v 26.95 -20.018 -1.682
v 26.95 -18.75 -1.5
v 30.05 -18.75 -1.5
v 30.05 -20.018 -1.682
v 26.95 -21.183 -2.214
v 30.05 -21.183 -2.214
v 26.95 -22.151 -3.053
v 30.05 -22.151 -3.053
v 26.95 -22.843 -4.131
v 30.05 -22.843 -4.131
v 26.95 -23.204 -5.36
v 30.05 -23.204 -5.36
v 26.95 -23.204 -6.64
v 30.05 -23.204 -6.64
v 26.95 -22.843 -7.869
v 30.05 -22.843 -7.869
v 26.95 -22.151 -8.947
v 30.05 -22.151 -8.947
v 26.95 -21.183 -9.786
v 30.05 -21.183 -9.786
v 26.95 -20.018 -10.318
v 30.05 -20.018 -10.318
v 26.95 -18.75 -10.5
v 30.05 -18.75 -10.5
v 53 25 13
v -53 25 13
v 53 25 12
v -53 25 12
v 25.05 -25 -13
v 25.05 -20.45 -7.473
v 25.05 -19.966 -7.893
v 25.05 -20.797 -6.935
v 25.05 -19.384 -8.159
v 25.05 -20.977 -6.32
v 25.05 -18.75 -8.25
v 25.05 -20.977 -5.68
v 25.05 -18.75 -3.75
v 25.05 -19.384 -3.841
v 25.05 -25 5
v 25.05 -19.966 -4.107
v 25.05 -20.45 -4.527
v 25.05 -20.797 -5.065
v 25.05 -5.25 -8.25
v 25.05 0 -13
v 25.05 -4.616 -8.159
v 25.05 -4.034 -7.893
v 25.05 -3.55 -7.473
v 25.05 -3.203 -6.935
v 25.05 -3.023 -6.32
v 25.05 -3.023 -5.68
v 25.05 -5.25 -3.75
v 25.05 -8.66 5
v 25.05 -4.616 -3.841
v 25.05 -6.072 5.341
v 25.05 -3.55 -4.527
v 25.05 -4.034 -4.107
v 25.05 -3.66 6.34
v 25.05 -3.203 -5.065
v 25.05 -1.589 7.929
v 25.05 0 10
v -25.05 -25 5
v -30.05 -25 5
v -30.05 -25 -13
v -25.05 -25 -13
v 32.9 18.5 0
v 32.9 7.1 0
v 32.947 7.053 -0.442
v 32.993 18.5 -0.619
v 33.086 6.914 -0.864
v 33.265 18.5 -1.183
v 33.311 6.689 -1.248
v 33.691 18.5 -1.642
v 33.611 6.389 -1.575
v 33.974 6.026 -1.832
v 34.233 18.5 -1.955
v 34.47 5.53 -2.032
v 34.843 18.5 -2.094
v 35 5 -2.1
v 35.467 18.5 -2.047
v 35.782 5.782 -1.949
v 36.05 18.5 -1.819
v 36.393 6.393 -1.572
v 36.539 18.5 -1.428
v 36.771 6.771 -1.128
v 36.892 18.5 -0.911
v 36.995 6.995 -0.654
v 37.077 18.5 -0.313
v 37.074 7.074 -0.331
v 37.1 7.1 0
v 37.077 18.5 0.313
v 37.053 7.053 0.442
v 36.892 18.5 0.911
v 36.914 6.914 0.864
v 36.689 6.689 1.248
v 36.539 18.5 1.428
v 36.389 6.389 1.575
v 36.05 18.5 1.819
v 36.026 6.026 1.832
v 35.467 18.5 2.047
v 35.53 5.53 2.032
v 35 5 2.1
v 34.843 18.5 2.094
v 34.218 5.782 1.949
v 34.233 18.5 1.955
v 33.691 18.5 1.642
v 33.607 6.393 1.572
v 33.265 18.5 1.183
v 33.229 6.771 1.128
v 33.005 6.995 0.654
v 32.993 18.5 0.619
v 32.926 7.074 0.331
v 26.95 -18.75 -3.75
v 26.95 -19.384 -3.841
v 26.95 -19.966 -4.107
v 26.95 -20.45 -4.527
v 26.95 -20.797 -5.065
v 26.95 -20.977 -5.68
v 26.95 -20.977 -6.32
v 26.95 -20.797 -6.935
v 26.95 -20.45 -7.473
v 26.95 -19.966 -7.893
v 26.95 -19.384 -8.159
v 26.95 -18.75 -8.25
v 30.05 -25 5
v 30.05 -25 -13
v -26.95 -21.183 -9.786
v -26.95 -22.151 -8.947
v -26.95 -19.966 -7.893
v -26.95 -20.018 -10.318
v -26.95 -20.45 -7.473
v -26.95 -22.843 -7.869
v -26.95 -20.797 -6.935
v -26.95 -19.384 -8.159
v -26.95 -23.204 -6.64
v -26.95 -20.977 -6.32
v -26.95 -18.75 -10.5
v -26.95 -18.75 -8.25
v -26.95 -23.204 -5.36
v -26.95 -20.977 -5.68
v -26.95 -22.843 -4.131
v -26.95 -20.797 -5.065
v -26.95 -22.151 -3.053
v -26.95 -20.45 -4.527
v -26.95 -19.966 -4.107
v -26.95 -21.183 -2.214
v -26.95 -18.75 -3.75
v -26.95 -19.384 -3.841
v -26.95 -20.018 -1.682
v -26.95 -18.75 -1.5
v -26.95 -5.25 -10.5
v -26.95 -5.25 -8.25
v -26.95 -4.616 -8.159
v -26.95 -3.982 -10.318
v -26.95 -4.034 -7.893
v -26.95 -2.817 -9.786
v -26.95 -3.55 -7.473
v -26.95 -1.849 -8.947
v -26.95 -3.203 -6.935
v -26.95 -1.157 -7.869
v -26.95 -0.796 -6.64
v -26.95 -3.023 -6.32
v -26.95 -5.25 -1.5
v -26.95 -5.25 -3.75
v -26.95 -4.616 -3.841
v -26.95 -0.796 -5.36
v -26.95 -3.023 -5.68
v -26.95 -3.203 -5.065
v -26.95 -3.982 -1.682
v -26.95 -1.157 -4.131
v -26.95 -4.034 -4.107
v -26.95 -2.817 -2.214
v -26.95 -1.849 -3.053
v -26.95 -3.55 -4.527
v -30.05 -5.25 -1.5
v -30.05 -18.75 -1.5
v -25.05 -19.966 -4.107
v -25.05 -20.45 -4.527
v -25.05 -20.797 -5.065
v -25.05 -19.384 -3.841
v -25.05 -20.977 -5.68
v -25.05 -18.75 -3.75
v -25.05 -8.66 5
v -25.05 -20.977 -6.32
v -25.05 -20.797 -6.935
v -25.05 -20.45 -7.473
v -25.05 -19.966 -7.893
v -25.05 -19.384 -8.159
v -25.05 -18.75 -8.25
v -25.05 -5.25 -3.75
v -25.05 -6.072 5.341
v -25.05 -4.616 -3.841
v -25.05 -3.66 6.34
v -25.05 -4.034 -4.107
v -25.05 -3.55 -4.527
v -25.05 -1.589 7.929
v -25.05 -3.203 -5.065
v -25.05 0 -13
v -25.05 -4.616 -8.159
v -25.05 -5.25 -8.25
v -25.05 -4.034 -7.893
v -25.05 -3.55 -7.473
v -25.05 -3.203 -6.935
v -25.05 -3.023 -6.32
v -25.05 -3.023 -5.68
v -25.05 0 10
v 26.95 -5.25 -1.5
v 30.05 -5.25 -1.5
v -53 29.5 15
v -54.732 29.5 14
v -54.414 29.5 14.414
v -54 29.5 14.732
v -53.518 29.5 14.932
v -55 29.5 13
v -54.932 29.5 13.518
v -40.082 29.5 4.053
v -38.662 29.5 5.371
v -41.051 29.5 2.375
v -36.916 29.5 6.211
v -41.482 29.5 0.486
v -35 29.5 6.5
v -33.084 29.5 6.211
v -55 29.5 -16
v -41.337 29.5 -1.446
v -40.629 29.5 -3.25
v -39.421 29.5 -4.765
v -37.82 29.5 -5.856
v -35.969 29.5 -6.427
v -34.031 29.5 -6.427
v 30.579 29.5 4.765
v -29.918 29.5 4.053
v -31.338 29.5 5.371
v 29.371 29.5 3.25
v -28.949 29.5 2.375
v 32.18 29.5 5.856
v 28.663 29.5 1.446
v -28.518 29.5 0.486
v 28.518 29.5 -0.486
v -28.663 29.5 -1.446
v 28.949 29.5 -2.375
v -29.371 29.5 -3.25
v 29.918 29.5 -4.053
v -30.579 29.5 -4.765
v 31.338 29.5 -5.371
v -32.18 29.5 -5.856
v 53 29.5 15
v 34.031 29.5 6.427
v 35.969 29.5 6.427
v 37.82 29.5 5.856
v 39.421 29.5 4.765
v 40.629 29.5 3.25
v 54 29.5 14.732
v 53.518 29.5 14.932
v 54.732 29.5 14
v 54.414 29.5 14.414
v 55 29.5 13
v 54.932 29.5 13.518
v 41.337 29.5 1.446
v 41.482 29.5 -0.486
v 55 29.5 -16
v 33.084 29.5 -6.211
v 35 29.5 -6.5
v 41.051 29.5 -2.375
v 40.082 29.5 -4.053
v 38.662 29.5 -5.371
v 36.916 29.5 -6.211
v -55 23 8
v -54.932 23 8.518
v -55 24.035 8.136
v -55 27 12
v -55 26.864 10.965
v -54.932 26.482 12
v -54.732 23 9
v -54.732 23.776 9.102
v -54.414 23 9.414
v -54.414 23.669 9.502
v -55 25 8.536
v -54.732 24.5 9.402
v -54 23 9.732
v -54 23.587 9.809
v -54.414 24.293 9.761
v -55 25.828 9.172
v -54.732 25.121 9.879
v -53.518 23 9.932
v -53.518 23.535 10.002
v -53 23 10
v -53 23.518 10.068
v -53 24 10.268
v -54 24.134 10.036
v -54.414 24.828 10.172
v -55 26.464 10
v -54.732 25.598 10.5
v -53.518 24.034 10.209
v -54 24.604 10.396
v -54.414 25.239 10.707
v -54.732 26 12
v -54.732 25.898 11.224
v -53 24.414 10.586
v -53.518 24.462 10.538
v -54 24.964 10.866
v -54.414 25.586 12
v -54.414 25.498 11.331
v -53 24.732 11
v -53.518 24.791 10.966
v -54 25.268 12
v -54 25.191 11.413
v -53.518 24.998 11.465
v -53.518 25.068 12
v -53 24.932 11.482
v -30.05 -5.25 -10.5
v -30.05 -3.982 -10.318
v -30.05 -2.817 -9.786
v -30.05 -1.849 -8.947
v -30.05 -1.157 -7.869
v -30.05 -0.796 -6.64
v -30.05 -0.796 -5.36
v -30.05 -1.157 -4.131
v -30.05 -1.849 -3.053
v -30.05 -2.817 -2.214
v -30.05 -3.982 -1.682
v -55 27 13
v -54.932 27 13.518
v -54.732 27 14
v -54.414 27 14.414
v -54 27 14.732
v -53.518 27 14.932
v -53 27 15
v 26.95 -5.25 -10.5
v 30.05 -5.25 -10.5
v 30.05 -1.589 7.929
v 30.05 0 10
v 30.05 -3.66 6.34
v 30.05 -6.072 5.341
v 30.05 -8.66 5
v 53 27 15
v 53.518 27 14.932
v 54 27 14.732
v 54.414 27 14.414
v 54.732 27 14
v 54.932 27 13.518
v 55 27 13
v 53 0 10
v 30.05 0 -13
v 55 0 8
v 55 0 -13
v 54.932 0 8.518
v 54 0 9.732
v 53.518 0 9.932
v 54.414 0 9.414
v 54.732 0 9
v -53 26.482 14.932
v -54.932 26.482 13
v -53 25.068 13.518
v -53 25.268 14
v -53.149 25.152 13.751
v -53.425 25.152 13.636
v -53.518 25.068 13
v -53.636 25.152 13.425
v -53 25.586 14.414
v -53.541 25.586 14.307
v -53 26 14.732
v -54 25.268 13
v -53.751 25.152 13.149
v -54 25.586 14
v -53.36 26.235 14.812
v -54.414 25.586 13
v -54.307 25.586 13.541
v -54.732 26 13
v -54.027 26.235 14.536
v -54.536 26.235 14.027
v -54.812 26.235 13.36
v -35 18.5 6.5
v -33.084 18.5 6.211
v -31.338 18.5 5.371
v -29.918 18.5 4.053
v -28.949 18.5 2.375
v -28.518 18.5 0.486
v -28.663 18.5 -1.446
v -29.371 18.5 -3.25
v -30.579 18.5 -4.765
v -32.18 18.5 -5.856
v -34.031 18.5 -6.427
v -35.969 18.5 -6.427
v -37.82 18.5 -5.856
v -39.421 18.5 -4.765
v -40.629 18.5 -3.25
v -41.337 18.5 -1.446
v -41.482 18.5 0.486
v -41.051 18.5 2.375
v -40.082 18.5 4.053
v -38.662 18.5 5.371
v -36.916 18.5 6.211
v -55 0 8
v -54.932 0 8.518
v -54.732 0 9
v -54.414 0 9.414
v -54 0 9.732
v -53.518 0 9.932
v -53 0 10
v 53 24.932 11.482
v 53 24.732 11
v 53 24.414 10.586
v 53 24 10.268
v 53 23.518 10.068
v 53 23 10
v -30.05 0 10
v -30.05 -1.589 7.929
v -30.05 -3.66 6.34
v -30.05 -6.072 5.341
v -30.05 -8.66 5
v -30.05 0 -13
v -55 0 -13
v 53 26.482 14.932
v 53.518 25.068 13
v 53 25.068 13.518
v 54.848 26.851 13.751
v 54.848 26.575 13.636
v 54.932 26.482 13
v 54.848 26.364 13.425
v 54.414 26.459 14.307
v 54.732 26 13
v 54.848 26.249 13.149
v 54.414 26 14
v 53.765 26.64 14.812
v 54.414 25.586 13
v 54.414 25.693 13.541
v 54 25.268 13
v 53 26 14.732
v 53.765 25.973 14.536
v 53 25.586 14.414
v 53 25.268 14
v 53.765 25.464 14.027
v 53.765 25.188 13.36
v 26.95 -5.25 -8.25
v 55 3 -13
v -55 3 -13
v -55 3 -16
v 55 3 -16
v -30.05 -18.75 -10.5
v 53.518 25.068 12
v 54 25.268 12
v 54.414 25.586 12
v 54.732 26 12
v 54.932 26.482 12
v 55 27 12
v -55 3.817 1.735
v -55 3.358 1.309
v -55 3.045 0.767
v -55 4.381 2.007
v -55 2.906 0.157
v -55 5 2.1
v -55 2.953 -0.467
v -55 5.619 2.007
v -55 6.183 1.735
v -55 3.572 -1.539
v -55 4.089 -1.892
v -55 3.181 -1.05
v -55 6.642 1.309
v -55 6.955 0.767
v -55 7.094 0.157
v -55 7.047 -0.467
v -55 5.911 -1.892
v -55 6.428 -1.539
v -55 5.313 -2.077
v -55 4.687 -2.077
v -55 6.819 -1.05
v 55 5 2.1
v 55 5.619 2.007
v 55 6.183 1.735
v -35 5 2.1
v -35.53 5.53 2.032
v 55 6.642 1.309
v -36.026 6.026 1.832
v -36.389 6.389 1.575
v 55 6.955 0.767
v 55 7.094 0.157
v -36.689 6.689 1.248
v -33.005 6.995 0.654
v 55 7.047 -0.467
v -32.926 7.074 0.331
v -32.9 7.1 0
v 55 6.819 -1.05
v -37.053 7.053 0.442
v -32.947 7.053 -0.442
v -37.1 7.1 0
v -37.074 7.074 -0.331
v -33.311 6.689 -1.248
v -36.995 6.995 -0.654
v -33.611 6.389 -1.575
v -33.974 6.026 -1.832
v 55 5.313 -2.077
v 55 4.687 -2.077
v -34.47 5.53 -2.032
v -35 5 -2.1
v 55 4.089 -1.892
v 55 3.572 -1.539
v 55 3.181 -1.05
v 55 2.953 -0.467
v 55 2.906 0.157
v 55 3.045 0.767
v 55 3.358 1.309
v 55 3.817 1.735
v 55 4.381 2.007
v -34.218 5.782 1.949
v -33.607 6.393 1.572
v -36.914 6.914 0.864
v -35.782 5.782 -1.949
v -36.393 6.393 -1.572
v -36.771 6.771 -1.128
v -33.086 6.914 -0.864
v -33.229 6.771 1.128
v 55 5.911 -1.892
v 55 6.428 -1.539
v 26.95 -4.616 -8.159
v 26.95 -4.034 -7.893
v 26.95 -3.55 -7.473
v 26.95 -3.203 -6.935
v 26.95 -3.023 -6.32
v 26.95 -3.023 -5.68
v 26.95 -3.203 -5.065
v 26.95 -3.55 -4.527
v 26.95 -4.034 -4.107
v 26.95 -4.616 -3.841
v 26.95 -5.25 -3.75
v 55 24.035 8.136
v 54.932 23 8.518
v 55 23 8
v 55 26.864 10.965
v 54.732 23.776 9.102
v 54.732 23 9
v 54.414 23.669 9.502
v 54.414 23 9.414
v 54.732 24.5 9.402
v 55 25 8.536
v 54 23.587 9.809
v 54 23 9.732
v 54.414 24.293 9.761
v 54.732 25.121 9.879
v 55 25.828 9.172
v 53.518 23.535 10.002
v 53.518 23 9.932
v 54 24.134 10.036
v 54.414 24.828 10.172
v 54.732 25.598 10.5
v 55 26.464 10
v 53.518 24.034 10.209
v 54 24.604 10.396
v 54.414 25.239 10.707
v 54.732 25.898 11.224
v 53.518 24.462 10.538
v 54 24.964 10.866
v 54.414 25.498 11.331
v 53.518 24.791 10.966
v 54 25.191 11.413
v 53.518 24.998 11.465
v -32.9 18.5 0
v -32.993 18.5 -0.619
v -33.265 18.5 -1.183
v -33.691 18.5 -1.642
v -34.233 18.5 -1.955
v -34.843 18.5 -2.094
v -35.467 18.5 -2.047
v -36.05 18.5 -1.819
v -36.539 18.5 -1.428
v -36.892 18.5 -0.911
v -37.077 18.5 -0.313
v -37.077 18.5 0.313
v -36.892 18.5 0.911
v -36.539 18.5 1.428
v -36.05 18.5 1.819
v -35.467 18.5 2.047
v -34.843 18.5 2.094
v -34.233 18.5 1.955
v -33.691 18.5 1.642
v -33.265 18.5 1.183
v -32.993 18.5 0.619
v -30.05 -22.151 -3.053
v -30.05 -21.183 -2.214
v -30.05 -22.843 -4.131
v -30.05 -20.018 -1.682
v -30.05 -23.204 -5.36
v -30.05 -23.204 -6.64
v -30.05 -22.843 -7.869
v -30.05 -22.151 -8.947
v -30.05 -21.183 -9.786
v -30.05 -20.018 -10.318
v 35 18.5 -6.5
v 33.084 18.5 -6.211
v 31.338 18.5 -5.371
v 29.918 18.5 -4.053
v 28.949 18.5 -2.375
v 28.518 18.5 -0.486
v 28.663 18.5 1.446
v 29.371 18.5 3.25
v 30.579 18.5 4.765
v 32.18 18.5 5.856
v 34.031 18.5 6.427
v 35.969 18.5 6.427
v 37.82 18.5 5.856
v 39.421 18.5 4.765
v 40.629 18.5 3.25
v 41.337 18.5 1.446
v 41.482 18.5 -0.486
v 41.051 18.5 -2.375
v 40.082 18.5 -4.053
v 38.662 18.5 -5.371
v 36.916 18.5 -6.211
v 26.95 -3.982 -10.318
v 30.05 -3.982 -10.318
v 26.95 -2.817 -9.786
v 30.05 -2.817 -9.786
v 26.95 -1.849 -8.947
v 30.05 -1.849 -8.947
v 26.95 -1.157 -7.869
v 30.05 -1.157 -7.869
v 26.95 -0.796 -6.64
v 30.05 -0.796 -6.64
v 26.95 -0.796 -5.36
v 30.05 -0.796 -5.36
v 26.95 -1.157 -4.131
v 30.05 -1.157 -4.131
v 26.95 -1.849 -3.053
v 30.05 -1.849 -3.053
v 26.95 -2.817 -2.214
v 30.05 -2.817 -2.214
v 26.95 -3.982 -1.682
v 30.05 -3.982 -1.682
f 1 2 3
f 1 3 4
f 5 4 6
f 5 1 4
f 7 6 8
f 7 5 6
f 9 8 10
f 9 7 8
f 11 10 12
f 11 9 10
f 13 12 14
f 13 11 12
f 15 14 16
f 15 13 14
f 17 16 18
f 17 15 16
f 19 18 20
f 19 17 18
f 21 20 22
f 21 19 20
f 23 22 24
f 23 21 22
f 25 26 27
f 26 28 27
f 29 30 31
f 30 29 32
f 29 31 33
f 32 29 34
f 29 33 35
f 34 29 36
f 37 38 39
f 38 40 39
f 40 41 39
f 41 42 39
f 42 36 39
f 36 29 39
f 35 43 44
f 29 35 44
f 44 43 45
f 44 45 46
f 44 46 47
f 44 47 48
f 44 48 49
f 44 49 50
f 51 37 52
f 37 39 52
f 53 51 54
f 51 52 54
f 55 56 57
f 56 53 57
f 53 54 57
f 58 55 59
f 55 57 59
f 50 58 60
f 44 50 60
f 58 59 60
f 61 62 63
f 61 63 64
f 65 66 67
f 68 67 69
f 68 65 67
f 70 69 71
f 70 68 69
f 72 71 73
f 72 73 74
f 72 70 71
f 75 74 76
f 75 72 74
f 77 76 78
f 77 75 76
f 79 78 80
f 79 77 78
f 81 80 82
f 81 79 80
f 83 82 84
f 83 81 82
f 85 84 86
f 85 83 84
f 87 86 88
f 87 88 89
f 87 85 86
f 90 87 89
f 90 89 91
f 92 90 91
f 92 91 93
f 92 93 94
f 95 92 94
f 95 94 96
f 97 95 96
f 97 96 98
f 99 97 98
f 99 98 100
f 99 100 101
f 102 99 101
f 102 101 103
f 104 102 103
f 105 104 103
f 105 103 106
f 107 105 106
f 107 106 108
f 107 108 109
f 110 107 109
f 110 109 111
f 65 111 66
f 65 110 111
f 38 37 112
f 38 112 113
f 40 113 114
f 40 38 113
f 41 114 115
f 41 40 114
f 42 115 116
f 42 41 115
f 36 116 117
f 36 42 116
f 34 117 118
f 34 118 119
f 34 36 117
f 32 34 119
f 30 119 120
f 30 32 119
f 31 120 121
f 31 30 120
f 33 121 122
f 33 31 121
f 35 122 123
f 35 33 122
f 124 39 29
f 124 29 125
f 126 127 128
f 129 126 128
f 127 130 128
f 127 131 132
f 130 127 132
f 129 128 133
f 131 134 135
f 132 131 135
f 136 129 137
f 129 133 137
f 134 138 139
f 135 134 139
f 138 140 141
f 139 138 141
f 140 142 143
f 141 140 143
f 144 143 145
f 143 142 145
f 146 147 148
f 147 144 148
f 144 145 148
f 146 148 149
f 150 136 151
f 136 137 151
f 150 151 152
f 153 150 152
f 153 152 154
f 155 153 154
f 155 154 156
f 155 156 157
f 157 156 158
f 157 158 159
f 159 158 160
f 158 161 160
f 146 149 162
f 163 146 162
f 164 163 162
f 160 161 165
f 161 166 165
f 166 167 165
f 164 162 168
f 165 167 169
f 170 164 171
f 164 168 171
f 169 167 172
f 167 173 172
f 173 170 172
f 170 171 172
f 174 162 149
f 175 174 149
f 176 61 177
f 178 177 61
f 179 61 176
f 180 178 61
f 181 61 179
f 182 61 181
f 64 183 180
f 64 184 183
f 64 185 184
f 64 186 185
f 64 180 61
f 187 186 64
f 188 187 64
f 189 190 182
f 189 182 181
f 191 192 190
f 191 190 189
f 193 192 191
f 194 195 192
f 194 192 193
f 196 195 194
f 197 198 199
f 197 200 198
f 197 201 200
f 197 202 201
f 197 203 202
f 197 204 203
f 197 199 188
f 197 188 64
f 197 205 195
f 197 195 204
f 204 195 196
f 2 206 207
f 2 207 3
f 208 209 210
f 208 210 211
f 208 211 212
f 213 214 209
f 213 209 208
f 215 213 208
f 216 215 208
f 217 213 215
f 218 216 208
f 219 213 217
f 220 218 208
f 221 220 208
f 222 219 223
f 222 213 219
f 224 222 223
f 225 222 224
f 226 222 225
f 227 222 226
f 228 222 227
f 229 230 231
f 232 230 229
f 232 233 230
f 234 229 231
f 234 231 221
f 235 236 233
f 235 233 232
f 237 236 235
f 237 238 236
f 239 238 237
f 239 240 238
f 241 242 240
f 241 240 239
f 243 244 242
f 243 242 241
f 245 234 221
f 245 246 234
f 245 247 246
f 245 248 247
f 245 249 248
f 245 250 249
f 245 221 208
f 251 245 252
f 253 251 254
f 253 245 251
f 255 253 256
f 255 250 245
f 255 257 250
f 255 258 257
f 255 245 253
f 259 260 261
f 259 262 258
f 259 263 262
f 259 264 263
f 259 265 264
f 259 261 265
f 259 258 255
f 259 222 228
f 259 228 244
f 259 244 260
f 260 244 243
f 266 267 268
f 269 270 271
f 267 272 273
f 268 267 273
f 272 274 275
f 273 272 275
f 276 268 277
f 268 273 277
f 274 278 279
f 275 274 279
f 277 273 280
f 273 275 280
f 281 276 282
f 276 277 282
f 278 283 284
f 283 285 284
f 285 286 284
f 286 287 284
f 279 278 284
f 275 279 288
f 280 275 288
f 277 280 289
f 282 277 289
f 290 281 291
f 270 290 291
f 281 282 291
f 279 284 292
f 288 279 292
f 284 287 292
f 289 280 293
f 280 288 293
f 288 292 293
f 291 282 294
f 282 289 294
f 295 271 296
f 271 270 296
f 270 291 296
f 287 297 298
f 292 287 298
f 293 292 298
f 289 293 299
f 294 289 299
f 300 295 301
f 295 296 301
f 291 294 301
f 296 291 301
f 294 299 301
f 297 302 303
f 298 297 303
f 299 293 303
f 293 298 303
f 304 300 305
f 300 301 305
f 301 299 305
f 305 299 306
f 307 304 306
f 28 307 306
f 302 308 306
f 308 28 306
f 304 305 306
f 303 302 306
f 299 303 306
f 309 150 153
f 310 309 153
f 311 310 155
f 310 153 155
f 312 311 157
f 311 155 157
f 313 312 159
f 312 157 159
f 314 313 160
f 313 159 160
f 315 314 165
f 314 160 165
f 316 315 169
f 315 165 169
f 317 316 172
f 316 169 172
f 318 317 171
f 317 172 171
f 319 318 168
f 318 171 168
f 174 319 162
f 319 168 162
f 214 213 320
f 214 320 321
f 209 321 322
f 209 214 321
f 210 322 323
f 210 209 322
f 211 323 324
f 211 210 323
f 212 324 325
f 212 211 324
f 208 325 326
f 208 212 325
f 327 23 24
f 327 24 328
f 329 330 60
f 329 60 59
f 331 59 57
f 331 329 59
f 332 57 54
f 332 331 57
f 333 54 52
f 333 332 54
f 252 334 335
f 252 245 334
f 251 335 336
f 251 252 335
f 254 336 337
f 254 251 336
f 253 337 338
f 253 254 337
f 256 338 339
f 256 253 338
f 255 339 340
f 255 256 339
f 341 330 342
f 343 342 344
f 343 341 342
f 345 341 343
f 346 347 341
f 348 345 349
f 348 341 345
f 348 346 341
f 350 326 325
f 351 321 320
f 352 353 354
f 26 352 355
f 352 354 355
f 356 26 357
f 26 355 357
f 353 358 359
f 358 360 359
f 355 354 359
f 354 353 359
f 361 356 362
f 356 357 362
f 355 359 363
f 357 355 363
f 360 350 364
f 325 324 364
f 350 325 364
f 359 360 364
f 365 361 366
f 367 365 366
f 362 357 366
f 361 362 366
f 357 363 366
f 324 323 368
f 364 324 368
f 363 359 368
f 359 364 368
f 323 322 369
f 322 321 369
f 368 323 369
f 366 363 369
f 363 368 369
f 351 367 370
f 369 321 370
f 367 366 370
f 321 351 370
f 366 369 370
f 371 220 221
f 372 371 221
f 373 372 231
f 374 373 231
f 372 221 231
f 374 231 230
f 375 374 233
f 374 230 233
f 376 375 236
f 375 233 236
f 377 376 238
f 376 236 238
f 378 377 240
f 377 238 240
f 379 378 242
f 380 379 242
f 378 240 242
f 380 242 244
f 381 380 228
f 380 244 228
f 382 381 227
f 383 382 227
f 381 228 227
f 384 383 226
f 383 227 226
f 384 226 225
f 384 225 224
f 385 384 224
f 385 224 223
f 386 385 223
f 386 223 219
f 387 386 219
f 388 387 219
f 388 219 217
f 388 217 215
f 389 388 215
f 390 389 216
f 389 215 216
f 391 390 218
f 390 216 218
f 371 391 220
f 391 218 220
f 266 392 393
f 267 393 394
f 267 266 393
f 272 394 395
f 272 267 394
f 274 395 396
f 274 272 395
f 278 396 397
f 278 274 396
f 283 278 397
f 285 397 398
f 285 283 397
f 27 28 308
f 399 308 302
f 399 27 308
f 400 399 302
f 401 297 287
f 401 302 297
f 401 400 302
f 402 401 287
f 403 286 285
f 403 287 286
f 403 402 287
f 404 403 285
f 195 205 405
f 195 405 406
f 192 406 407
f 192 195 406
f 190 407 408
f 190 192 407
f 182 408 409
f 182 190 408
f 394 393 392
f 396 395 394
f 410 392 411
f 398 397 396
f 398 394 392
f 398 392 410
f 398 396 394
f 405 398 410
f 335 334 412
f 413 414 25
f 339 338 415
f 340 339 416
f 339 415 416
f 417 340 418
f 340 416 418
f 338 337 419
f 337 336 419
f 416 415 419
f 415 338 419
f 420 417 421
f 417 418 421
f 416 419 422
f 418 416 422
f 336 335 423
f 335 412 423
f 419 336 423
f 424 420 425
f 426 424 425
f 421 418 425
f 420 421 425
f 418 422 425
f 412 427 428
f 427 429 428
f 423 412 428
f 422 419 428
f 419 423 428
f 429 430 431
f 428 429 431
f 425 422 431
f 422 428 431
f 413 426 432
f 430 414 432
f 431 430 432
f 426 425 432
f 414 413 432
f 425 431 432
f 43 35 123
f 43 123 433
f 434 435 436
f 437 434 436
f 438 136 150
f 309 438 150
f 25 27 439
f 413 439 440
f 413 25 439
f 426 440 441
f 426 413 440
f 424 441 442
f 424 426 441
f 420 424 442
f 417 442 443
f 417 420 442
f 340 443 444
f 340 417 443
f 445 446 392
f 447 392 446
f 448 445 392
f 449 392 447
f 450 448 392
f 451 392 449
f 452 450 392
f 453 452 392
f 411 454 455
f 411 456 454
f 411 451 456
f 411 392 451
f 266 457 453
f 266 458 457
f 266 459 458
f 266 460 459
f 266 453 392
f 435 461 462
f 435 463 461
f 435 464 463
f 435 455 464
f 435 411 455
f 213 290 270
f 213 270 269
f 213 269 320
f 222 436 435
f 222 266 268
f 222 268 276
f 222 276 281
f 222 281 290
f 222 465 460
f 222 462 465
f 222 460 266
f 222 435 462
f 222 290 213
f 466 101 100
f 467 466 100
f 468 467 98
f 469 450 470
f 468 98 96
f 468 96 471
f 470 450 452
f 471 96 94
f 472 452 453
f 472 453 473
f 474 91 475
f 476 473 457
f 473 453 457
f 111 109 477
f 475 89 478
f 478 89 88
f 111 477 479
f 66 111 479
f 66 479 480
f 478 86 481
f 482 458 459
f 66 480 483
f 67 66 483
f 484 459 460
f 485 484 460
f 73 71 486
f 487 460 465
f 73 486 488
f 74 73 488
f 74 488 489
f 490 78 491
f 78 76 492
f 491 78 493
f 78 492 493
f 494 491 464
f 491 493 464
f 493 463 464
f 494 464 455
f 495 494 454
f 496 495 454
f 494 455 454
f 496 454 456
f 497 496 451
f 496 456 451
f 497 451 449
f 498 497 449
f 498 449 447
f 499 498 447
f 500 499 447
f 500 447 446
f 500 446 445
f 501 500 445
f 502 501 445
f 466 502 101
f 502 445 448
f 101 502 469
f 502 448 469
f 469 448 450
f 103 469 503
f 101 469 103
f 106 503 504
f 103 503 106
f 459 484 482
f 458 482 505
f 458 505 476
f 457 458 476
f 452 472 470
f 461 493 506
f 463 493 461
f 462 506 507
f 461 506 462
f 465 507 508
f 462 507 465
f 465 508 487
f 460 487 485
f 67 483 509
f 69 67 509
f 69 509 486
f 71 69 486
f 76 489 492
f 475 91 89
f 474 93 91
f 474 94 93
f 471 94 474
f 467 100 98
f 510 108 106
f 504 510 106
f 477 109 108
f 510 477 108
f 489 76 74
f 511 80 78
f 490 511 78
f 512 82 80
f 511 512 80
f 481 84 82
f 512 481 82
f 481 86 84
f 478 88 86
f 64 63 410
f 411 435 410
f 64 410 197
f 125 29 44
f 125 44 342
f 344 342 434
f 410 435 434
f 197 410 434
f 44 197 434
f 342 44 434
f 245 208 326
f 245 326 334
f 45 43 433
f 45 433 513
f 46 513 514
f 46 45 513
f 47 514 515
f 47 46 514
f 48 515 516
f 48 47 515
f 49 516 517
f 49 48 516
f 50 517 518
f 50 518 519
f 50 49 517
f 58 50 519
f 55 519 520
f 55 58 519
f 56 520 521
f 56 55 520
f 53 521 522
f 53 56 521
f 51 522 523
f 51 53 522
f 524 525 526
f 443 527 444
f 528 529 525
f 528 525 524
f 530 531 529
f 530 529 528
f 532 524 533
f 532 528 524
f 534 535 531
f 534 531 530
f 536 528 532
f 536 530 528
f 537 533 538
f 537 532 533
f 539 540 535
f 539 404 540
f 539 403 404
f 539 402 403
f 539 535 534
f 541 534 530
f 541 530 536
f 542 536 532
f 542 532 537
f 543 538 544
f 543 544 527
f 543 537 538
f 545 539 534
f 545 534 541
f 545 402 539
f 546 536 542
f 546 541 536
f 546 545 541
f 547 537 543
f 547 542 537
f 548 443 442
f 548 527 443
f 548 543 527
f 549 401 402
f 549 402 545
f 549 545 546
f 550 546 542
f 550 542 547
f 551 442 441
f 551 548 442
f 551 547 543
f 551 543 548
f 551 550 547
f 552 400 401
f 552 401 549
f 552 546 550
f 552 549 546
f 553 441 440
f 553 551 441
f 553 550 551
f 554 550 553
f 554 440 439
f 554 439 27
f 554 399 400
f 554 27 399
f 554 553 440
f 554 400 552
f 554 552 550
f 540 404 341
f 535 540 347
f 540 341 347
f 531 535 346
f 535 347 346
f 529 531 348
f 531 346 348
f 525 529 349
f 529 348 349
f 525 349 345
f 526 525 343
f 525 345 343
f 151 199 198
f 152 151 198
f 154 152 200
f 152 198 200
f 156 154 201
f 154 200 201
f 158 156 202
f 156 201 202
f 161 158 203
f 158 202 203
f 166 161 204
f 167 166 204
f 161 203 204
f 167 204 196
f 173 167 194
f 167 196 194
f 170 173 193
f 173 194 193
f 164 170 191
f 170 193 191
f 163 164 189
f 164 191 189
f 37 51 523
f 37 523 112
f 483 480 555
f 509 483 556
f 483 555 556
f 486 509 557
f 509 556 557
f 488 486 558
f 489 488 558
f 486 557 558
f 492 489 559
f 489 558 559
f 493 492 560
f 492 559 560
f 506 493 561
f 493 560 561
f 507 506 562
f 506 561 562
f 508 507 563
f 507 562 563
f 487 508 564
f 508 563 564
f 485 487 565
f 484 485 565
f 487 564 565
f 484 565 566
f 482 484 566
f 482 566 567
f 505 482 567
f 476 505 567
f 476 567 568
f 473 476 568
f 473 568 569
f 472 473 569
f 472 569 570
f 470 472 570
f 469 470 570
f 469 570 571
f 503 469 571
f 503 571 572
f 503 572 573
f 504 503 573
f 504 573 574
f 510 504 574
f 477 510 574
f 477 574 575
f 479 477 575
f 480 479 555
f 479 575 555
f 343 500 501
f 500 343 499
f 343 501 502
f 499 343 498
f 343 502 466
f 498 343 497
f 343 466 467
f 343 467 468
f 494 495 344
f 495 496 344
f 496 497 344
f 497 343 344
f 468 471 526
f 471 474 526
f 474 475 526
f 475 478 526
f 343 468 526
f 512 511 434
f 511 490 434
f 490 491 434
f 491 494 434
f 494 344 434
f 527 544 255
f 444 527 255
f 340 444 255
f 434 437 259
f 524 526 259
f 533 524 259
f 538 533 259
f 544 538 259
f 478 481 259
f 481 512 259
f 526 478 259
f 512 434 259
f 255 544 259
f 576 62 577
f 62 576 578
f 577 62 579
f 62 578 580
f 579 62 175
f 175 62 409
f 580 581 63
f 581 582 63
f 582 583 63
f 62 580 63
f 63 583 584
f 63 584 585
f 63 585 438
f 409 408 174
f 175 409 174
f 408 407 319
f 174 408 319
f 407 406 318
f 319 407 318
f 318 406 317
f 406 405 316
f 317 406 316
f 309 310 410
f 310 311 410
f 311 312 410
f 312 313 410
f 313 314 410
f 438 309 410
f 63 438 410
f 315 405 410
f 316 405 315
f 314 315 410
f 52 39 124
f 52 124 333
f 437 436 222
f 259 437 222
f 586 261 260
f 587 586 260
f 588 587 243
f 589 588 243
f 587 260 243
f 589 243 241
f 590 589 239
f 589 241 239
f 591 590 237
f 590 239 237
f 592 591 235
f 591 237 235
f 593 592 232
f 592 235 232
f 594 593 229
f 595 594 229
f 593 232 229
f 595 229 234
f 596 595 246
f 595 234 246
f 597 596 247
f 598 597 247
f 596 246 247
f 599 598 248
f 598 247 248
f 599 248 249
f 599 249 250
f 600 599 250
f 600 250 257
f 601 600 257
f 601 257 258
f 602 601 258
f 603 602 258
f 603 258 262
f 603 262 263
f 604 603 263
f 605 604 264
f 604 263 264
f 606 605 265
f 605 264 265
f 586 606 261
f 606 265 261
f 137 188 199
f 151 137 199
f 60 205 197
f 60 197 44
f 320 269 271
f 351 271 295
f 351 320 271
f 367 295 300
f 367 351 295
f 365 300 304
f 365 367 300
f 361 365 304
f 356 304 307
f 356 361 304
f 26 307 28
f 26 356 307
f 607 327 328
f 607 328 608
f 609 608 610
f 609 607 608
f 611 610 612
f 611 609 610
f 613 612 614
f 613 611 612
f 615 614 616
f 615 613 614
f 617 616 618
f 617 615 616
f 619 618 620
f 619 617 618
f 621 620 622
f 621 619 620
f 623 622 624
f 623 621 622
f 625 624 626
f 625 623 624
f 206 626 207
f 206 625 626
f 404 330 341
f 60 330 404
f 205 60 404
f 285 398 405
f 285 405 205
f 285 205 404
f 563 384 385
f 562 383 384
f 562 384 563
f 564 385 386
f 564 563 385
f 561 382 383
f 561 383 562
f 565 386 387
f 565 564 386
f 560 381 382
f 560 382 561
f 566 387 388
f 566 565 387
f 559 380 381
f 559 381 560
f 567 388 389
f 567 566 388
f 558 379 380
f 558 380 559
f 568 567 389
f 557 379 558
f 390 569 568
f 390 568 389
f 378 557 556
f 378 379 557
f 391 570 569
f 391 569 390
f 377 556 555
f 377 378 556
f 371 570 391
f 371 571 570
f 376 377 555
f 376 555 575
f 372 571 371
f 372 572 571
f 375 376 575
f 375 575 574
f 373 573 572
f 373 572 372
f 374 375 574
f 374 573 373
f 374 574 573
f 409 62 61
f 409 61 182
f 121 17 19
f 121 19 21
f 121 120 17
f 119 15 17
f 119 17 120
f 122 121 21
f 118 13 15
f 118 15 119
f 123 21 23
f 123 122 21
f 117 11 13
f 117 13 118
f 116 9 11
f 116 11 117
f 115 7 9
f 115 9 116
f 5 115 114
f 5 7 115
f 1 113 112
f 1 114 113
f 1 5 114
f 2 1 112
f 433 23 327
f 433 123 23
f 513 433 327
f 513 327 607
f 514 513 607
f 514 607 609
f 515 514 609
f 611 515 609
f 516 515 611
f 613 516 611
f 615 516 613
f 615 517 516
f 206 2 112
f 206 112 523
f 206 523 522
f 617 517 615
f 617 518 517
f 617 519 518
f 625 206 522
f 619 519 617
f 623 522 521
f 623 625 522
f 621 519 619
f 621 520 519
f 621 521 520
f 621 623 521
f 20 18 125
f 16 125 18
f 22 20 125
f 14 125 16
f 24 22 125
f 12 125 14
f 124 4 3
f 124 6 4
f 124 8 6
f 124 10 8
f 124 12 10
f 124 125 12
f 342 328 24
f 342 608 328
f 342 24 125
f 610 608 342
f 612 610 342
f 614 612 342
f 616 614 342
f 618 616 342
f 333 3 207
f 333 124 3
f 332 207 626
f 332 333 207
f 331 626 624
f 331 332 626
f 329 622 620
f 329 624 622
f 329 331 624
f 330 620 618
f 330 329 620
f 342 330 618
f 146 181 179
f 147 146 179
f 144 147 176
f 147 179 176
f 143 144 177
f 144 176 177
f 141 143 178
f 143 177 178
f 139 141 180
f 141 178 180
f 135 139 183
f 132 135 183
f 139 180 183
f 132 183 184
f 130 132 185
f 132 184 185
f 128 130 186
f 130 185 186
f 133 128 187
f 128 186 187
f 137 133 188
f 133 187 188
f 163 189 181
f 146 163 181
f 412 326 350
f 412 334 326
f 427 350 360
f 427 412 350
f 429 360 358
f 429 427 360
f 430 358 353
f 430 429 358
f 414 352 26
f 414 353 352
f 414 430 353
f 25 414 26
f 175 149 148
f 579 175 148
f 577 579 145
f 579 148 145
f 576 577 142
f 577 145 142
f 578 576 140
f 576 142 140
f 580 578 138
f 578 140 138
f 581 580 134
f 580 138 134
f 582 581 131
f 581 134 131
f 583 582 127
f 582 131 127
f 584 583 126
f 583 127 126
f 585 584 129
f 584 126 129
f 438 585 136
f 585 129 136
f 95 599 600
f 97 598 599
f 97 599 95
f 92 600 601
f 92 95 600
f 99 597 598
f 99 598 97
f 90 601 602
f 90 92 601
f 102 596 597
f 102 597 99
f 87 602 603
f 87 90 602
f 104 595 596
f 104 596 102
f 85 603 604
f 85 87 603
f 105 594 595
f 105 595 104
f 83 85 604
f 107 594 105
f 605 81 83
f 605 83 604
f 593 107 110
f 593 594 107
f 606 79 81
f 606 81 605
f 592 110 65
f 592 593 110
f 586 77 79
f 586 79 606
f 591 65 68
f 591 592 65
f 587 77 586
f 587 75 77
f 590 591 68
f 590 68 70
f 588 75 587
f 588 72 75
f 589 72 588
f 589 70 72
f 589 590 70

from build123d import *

# Parameters (mm, degrees)
AUFSATZ_LINEAR_AUSTRAGEN2_DEPTH                = 13
STIRNSENKUNG_START                             = 26.95
STIRNSENKUNG_LANGLOCH_F_R_M4_FLACHKOPFSC_DEPTH = 3.1
STIRNSENKUNG_START_2                           = 25.05
STIRNSENKUNG_LANGLOCH_F_R_M4_FLACHKO_3_DEPTH   = 1.9
SCHNITT_LINEAR_AUSTRAGEN1_DEPTH                = 91.954672777
SCHNITT_LINEAR_AUSTRAGEN1_DEPTH_BACK           = 91.954672777
VERRUNDUNG1_R                                  = 10
AUFSATZ_LINEAR_AUSTRAGEN4_REACH                = 65.751
SKIZZE9_W                                      = 3
SKIZZE9_H                                      = 26.5
AUFSATZ_LINEAR_AUSTRAGEN4_DIRECTION_2_REACH    = 65.751
SKIZZE18_W                                     = 110
SKIZZE18_H                                     = 4.5
AUFSATZ_LINEAR_AUSTRAGEN5_DEPTH                = 2
F_4_2_4_2_DURCHMESSER_BOHRUNG1_D               = 4.2
SKIZZE19_R                                     = 6.5
SCHNITT_LINEAR_AUSTRAGEN2_DEPTH                = 11
M5_GEWINDEBOHRUNG1_REACH                       = 73.925
M5_GEWINDEBOHRUNG1_BORE_R                      = 2.1
VERRUNDUNG2_R                                  = 2


# Read off the part's stored shape, not the designer's step: Stirnsenkung Langloch für M4 Flachkopfschraube mit Schlitz12
with BuildPart() as part:
    # Skizze2 → Aufsatz-Linear austragen2 (new, symmetric)
    with BuildSketch(Plane.XY):
        Polygon((-25.05, -25), (-25.05, 0), (25.05, 0), (25.05, -25), (30.05, -25), (30.05, 0), (55, 0), (55, 29.5), (-55, 29.5), (-55, 0), (-30.05, 0), (-30.05, -25), align=None)
    extrude(amount=AUFSATZ_LINEAR_AUSTRAGEN2_DEPTH, both=True)

    # Stirnsenkung Langloch f_r M4 Flachko 2 → Stirnsenkung Langloch für M4 Flachkopfschraube mit Schlitz12 (cut)
    with BuildSketch(Plane.YZ.offset(STIRNSENKUNG_START)):
        with BuildLine():
            Line((-5.25, -1.5), (-18.75, -1.5))
            ThreePointArc((-18.75, -1.5), (-23.25, -6), (-18.75, -10.5))
            Line((-18.75, -10.5), (-5.25, -10.5))
            ThreePointArc((-5.25, -10.5), (-0.75, -6), (-5.25, -1.5))
        make_face()
    stirnsenkung_langloch_f_r_m4_flachkopfsc = extrude(amount=STIRNSENKUNG_LANGLOCH_F_R_M4_FLACHKOPFSC_DEPTH, mode=Mode.SUBTRACT)

    # Stirnsenkung Langloch f_r M4 Flachko 3 o → Stirnsenkung Langloch f_r M4 Flachko 3 (cut)
    with BuildSketch(Plane.YZ.offset(STIRNSENKUNG_START_2)):
        with BuildLine():
            Line((-5.25, -3.75), (-18.75, -3.75))
            ThreePointArc((-18.75, -3.75), (-21, -6), (-18.75, -8.25))
            Line((-18.75, -8.25), (-5.25, -8.25))
            ThreePointArc((-5.25, -8.25), (-3, -6), (-5.25, -3.75))
        make_face()
    stirnsenkung_langloch_f_r_m4_flachko_3 = extrude(amount=STIRNSENKUNG_LANGLOCH_F_R_M4_FLACHKO_3_DEPTH, mode=Mode.SUBTRACT)

    # Skizze5 → Schnitt-Linear austragen1 (cut, two sides: drawn at the far end of the back side and taken through both)
    with BuildSketch(Plane(origin=(30.05, 0, 0), x_dir=(0, 0, -1), z_dir=(1, 0, 0)).offset(-SCHNITT_LINEAR_AUSTRAGEN1_DEPTH_BACK)):
        Polygon((-10, 0), (-10, 25), (-13, 25), (-13, -25), (-5, -25), (-5, 0), align=None)
    extrude(amount=SCHNITT_LINEAR_AUSTRAGEN1_DEPTH + SCHNITT_LINEAR_AUSTRAGEN1_DEPTH_BACK, mode=Mode.SUBTRACT)

    # Verrundung1
    # the kernel refuses this fillet: 10 mm, written as the material it adds along each edge
    with BuildSketch(Plane(origin=(-25.05, 0, 5), x_dir=(0, 0, 1), z_dir=(-1, 0, 0))) as verrundung1_piece_1:
        with BuildLine():
            CenterArc((10, -8.660254038), VERRUNDUNG1_R, 120, 60)
            Line((0, -8.660254038), (-0.2, -8.660254038))
            Line((-0.2, -8.660254038), (-0.2, 0))
            Line((-0.2, 0), (0, 0.2))
            ThreePointArc((0, 0.2), (2.5, 0.2), (4.9, 0.173205081))
            Line((4.9, 0.173205081), (5, 0))
        make_face()
    extrude(amount=5)
    with BuildSketch(Plane(origin=(30.05, 0, 5), x_dir=(0, -1, 0), z_dir=(-1, 0, 0))) as verrundung1_piece_2:
        with BuildLine():
            CenterArc((8.660254038, 10), VERRUNDUNG1_R, 210, 60)
            Line((0, 5), (-0.173205081, 4.9))
            ThreePointArc((-0.173205081, 4.9), (-0.2, 2.5), (-0.2, 0))
            Line((-0.2, 0), (0, -0.2))
            Line((0, -0.2), (8.660254038, -0.2))
            Line((8.660254038, -0.2), (8.660254038, 0))
        make_face()
    extrude(amount=5)

    # Aufsatz-Linear austragen4: up to this face of the body (flat: up to its plane)
    aufsatz_linear_austragen4_end = Plane(part.part.faces().sort_by_distance((55, 14.993858382, -1.246387283))[0])
    # Skizze9 → Aufsatz-Linear austragen4 (add, up to the picked face)
    with BuildSketch(Plane(origin=(0, 0, 0), x_dir=(0, 0, -1), z_dir=(1, 0, 0)), mode=Mode.PRIVATE) as aufsatz_linear_austragen4_sk1:
        with Locations((14.5, 16.25)):
            Rectangle(SKIZZE9_W, SKIZZE9_H)
    aufsatz_linear_austragen4_tool1 = split(extrude(aufsatz_linear_austragen4_sk1.sketch, amount=AUFSATZ_LINEAR_AUSTRAGEN4_REACH, mode=Mode.PRIVATE), bisect_by=aufsatz_linear_austragen4_end, keep=Keep.BOTH, mode=Mode.PRIVATE)
    add(aufsatz_linear_austragen4_tool1.solids().sort_by(Axis((0, 16.25, -14.5), (1, 0, 0)))[0])

    # Aufsatz-Linear austragen4 direction 2: up to this face of the body (flat: up to its plane)
    aufsatz_linear_austragen4_direction_2_end = Plane(part.part.faces().sort_by_distance((-55, 14.993858382, -1.246387283))[0])
    # Skizze9 → Aufsatz-Linear austragen4 direction 2 (add, up to the picked face)
    with BuildSketch(Plane(origin=(0, 0, 0), x_dir=(0, 0, -1), z_dir=(1, 0, 0)), mode=Mode.PRIVATE) as aufsatz_linear_austragen4_direction_2_sk1:
        with Locations((14.5, 16.25)):
            Rectangle(SKIZZE9_W, SKIZZE9_H)
    aufsatz_linear_austragen4_direction_2_tool1 = split(extrude(aufsatz_linear_austragen4_direction_2_sk1.sketch, amount=-AUFSATZ_LINEAR_AUSTRAGEN4_DIRECTION_2_REACH, mode=Mode.PRIVATE), bisect_by=aufsatz_linear_austragen4_direction_2_end, keep=Keep.BOTH, mode=Mode.PRIVATE)
    add(aufsatz_linear_austragen4_direction_2_tool1.solids().sort_by(Axis((0, 16.25, -14.5), (-1, 0, 0)))[0])

    # Skizze18 → Aufsatz-Linear austragen5 (add)
    with BuildSketch(Plane.XY.offset(13)):
        with Locations((0, 27.25)):
            Rectangle(SKIZZE18_W, SKIZZE18_H)
    extrude(amount=AUFSATZ_LINEAR_AUSTRAGEN5_DEPTH)

    # Ø4.2 (4.2) Durchmesser Bohrung1 (through all)
    with Locations(Plane(origin=(55, 0, 0), x_dir=(0, 0, -1), z_dir=(1, 0, 0))):
        with Locations((0, 5)):
            Hole(F_4_2_4_2_DURCHMESSER_BOHRUNG1_D / 2)

    # Spiegeln2: Stirnsenkung Langloch für M4 Flachkopfschraube mit Schlitz12, Stirnsenkung Langloch f_r M4 Flachko 3 across plane
    add(stirnsenkung_langloch_f_r_m4_flachkopfsc.mirror(Plane(origin=(0, 0, 0), x_dir=(0, 0, 1), z_dir=(1, 0, 0))), mode=Mode.SUBTRACT)
    add(stirnsenkung_langloch_f_r_m4_flachko_3.mirror(Plane(origin=(0, 0, 0), x_dir=(0, 0, 1), z_dir=(1, 0, 0))), mode=Mode.SUBTRACT)

    # Skizze19 → Schnitt-Linear austragen2 (cut)
    with BuildSketch(Plane(origin=(0, 29.5, 0), x_dir=(1, 0, 0), z_dir=(0, 1, 0))):
        with Locations(Location((-35, 0, 0), (0, 0, 270))):
            Circle(SKIZZE19_R)
        with Locations(Location((35, 0, 0), (0, 0, 90))):
            Circle(SKIZZE19_R)
    extrude(amount=-SCHNITT_LINEAR_AUSTRAGEN2_DEPTH, mode=Mode.SUBTRACT)

    # M5 Gewindebohrung1 bore → M5 Gewindebohrung1 (cut, up to next)
    with BuildSketch(Plane(origin=(0, 18.5, 0), x_dir=(1, 0, 0), z_dir=(0, 1, 0)), mode=Mode.PRIVATE) as m5_gewindebohrung1_sk1:
        with Locations((-35, 0)):
            Circle(M5_GEWINDEBOHRUNG1_BORE_R)
    m5_gewindebohrung1_tool1 = extrude(m5_gewindebohrung1_sk1.sketch, amount=-M5_GEWINDEBOHRUNG1_REACH, mode=Mode.PRIVATE) & part.part
    m5_gewindebohrung1 = m5_gewindebohrung1_tool1.solids().sort_by_distance((-35, 18.5, 0))[0]
    add(m5_gewindebohrung1, mode=Mode.SUBTRACT)

    # Verrundung2
    verrundung2_edges = [part.edges().sort_by_distance(p)[0] for p in [
        (-55, 27.25, 15),
        (0, 25, 15),
        (55, 27.25, 15),
        (55, 12.5, 10),
        (55, 25, 12.5),
        (-55, 25, 12.5),
        (0, 25, 10),
        (-55, 12.5, 10),
    ]]
    fillet(verrundung2_edges, radius=VERRUNDUNG2_R)

    # Spiegeln3: M5 Gewindebohrung1 across plane
    add(m5_gewindebohrung1.mirror(Plane(origin=(0, 0, 0), x_dir=(0, 0, 1), z_dir=(1, 0, 0))), mode=Mode.SUBTRACT)


solid = part.part
